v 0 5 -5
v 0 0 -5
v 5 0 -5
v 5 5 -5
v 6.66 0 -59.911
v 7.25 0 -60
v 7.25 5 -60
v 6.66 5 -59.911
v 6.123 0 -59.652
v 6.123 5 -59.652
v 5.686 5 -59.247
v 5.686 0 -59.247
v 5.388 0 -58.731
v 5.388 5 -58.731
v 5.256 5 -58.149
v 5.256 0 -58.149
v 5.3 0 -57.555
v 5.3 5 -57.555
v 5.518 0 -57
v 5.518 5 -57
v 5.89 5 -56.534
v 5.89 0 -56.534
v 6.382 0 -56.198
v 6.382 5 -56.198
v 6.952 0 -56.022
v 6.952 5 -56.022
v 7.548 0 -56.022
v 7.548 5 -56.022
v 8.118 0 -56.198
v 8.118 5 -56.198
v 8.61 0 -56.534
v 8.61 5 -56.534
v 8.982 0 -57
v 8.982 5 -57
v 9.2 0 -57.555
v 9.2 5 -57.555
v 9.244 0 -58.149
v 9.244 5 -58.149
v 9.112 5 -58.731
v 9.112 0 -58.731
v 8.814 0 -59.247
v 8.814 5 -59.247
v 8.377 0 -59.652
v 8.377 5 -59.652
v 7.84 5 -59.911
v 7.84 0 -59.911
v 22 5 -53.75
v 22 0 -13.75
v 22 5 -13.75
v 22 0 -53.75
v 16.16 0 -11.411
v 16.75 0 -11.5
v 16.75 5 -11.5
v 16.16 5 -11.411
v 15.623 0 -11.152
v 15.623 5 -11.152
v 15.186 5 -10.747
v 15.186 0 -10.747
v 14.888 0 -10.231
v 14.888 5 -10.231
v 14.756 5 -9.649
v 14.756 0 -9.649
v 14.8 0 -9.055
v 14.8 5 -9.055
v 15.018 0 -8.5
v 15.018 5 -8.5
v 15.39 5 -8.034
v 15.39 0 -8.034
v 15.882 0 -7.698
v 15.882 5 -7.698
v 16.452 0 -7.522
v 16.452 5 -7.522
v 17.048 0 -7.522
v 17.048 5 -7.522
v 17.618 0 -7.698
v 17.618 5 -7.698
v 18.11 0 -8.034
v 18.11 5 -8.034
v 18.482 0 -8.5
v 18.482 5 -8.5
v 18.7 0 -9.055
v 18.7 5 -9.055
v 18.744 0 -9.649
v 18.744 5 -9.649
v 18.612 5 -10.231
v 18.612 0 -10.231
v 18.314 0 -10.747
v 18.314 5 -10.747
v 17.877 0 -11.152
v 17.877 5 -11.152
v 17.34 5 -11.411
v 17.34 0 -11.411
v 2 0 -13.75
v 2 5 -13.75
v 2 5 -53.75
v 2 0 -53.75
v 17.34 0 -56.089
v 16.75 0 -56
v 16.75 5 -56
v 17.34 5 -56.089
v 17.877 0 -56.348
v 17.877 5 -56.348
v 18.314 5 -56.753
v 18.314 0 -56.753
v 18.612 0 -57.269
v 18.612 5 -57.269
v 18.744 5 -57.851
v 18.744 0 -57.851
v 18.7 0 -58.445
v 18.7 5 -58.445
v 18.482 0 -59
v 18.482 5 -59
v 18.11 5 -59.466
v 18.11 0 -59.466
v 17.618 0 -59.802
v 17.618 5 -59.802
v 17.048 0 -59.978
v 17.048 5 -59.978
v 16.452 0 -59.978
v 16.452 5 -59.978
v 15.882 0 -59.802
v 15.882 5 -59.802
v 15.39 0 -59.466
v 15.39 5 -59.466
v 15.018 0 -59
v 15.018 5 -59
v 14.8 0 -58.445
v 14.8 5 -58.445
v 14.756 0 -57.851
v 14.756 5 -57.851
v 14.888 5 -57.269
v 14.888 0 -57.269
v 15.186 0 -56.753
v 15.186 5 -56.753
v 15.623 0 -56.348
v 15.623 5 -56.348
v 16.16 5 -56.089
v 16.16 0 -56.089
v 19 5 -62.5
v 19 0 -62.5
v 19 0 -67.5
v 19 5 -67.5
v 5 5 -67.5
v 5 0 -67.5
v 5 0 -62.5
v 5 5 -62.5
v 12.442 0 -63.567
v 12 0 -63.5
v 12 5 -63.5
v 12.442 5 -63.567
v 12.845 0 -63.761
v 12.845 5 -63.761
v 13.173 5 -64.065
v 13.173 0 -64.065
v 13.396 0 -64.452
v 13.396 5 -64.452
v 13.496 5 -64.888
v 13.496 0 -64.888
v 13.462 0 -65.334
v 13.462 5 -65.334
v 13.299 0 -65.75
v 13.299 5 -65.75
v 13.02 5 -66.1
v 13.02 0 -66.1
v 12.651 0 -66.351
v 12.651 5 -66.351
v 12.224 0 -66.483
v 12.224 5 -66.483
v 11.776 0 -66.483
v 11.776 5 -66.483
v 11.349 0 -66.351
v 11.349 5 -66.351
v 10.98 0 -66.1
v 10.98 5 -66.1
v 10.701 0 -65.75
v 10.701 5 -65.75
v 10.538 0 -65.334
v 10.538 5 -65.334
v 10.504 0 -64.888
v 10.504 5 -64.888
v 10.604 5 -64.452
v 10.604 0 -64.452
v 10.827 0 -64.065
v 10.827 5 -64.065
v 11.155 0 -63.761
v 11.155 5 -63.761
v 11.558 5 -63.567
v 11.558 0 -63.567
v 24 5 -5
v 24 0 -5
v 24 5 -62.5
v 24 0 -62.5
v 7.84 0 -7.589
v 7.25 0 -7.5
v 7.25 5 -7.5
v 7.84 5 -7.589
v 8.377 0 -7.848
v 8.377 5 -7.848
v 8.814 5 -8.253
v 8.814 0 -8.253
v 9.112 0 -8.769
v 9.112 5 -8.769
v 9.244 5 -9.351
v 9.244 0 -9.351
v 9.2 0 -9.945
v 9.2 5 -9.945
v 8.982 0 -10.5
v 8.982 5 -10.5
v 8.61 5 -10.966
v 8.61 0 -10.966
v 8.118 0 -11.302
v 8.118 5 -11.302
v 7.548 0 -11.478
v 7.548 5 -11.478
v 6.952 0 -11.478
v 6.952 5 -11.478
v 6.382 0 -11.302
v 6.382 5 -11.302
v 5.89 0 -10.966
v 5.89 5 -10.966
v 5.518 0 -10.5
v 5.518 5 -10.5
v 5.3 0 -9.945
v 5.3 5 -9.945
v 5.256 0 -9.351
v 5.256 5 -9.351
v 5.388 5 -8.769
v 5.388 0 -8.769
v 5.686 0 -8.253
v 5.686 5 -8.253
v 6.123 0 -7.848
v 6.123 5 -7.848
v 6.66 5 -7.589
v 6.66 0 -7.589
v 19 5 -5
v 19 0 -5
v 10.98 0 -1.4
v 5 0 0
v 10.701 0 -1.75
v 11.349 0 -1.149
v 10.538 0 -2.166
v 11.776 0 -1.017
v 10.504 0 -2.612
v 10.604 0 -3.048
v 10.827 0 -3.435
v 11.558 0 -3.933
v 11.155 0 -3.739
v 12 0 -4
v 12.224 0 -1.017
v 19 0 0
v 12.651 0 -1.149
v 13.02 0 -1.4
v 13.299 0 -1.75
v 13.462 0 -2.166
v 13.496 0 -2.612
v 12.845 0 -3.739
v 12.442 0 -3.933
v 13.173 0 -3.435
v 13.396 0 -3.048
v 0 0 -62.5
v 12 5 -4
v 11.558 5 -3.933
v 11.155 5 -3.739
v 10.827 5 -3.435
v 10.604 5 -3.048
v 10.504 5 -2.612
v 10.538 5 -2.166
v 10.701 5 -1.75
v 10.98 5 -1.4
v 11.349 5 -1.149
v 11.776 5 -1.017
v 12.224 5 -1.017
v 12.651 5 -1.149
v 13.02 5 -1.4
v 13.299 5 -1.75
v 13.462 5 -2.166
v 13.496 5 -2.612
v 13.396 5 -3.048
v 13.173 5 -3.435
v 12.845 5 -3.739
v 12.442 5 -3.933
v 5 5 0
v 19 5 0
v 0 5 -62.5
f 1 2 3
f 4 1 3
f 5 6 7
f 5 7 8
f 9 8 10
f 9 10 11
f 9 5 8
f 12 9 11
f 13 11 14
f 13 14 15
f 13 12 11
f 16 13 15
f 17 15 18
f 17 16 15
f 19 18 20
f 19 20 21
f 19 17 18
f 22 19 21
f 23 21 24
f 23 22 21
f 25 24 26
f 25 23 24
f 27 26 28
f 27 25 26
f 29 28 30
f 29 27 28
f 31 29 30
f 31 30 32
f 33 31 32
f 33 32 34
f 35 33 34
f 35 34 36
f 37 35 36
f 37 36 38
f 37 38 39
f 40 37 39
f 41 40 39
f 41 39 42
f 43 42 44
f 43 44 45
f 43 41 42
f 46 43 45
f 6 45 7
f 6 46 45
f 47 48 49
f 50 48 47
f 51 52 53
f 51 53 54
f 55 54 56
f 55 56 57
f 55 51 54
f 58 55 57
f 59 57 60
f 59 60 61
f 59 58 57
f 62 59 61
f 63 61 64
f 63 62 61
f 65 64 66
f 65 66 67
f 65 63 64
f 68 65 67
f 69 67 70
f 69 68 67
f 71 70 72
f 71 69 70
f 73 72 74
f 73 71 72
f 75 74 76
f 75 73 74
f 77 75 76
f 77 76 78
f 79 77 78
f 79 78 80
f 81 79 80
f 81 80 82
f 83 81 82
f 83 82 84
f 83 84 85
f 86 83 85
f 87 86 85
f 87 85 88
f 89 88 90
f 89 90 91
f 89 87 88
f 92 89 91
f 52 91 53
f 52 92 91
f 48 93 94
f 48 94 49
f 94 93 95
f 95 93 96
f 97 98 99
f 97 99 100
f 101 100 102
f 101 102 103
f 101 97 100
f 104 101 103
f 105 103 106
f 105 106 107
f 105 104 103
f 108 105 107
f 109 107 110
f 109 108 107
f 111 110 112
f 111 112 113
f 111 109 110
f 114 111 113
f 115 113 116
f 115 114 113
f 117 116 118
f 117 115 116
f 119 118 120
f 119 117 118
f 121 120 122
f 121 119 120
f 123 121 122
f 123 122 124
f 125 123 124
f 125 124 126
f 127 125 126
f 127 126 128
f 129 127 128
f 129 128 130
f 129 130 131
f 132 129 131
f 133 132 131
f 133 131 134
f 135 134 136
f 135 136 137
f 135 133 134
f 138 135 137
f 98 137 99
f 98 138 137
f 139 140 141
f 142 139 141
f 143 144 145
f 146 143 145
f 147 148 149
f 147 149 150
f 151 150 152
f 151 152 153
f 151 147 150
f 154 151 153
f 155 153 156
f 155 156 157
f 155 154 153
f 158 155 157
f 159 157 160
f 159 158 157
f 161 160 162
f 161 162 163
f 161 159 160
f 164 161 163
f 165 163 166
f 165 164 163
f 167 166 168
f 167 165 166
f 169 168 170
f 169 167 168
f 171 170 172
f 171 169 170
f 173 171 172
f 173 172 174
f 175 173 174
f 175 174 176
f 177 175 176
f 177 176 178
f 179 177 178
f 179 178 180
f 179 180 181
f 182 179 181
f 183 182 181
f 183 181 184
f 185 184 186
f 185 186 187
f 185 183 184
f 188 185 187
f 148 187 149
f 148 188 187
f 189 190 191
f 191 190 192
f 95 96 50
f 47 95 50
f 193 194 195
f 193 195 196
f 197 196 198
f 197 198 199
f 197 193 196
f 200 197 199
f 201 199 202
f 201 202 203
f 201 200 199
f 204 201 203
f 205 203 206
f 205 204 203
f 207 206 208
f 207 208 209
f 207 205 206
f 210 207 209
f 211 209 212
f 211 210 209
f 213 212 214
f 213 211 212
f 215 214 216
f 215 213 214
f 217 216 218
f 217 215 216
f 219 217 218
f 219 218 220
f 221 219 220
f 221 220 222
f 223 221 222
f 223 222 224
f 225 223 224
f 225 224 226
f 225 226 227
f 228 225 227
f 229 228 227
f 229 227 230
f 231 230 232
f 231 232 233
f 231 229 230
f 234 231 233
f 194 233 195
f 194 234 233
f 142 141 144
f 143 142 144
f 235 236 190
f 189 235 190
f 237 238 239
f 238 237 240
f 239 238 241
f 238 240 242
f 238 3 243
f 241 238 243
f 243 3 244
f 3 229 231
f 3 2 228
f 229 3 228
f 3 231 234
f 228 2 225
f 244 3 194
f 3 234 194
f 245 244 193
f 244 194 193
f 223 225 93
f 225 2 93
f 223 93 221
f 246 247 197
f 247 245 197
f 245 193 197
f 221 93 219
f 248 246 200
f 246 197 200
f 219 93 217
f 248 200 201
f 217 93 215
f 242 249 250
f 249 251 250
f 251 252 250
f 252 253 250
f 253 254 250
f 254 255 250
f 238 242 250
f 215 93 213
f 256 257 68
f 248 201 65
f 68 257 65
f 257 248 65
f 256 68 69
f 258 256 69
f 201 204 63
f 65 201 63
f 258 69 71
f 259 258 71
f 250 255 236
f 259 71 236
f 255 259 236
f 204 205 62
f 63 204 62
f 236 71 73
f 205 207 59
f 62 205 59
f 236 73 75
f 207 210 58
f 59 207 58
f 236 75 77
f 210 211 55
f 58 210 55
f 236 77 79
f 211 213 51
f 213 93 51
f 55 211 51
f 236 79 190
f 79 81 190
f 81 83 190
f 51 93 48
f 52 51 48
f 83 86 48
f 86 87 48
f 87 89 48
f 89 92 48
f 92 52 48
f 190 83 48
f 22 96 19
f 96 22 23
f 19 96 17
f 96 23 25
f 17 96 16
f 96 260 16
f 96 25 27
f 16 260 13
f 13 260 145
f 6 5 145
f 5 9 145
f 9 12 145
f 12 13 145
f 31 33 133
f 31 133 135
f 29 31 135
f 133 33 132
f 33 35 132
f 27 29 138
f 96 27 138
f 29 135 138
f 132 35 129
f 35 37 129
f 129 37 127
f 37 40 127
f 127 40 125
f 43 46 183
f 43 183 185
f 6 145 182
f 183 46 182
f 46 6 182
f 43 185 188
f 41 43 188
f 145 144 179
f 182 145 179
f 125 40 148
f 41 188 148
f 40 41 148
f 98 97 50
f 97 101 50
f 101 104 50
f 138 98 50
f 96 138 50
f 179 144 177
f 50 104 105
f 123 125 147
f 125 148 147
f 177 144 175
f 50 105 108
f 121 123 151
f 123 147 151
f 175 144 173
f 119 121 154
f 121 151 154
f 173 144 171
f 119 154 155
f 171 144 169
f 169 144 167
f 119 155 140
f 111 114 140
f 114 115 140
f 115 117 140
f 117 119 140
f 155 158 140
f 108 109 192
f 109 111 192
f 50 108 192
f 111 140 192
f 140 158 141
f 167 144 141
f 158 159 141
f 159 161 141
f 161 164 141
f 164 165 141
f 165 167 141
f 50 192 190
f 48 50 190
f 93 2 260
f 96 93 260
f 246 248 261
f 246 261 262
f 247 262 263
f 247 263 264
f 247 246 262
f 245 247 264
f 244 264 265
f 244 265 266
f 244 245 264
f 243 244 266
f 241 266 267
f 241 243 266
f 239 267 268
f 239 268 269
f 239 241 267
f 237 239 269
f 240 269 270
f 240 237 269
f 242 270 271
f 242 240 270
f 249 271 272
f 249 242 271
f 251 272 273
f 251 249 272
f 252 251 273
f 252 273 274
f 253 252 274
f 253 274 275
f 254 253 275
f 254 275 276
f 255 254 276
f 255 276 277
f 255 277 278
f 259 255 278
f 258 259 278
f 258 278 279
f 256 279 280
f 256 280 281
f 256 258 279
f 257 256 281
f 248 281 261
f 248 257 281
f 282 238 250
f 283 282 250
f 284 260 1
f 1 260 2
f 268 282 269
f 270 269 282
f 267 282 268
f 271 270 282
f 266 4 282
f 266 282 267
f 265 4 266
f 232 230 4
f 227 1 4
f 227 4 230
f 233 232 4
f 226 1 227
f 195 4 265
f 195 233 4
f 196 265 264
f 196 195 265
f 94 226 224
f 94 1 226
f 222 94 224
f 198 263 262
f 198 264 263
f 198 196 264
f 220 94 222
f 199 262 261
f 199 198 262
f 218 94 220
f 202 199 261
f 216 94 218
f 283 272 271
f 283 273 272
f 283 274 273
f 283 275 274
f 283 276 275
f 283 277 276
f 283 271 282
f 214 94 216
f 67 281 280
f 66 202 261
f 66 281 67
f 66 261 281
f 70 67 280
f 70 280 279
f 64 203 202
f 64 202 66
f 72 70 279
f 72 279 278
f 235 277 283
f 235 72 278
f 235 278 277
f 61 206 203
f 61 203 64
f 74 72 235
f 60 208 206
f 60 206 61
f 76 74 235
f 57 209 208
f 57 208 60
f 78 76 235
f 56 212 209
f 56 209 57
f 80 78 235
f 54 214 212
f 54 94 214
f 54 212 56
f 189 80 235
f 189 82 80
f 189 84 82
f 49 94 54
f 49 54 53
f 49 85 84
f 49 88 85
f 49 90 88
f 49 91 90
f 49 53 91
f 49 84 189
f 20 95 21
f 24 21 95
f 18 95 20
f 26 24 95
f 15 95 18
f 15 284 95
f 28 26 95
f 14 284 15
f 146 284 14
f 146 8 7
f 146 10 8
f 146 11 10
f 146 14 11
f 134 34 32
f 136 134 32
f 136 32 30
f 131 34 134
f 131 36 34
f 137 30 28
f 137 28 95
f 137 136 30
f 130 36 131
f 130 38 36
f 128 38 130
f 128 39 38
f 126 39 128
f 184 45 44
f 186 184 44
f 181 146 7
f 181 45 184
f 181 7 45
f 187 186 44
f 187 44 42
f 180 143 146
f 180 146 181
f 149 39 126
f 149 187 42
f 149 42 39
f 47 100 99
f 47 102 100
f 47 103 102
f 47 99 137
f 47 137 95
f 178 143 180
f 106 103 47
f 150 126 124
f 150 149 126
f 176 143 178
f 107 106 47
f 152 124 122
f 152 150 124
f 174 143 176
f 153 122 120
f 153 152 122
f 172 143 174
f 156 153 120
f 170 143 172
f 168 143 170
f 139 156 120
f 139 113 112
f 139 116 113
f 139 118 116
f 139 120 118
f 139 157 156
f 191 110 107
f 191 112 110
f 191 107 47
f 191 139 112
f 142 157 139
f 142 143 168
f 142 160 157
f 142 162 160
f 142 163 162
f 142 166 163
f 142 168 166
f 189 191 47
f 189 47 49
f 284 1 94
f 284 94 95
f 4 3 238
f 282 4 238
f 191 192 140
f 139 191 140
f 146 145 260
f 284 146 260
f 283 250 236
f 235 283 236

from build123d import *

# Parameters (mm, degrees)
SKETCH1_R           = 1.5
SKETCH1_R_2         = 2
SKETCH1_W           = 20
SKETCH1_H           = 40
BOSS_EXTRUDE1_DEPTH = 5


with BuildPart() as part:
    # Sketch1 → Boss-Extrude1 (new body)
    with BuildSketch(Plane(origin=(0, 0, 0), x_dir=(1, 0, 0), z_dir=(0, 1, 0))):
        Polygon((5, 0), (19, 0), (19, 5), (24, 5), (24, 62.5), (19, 62.5), (19, 67.5), (5, 67.5), (5, 62.5), (0, 62.5), (0, 5), (5, 5), align=None)
        with Locations(Location((12, 65, 0), (0, 0, 270))):
            Circle(SKETCH1_R, mode=Mode.SUBTRACT)
        with Locations(Location((12, 2.5, 0), (0, 0, 90))):
            Circle(SKETCH1_R, mode=Mode.SUBTRACT)
        with Locations(Location((16.75, 58, 0), (0, 0, 270))):
            Circle(SKETCH1_R_2, mode=Mode.SUBTRACT)
        with Locations(Location((7.25, 58, 0), (0, 0, 90))):
            Circle(SKETCH1_R_2, mode=Mode.SUBTRACT)
        with Locations(Location((16.75, 9.5, 0), (0, 0, 90))):
            Circle(SKETCH1_R_2, mode=Mode.SUBTRACT)
        with Locations(Location((7.25, 9.5, 0), (0, 0, 270))):
            Circle(SKETCH1_R_2, mode=Mode.SUBTRACT)
        with Locations((12, 33.75)):
            Rectangle(SKETCH1_W, SKETCH1_H, mode=Mode.SUBTRACT)
    extrude(amount=BOSS_EXTRUDE1_DEPTH)


solid = part.part
